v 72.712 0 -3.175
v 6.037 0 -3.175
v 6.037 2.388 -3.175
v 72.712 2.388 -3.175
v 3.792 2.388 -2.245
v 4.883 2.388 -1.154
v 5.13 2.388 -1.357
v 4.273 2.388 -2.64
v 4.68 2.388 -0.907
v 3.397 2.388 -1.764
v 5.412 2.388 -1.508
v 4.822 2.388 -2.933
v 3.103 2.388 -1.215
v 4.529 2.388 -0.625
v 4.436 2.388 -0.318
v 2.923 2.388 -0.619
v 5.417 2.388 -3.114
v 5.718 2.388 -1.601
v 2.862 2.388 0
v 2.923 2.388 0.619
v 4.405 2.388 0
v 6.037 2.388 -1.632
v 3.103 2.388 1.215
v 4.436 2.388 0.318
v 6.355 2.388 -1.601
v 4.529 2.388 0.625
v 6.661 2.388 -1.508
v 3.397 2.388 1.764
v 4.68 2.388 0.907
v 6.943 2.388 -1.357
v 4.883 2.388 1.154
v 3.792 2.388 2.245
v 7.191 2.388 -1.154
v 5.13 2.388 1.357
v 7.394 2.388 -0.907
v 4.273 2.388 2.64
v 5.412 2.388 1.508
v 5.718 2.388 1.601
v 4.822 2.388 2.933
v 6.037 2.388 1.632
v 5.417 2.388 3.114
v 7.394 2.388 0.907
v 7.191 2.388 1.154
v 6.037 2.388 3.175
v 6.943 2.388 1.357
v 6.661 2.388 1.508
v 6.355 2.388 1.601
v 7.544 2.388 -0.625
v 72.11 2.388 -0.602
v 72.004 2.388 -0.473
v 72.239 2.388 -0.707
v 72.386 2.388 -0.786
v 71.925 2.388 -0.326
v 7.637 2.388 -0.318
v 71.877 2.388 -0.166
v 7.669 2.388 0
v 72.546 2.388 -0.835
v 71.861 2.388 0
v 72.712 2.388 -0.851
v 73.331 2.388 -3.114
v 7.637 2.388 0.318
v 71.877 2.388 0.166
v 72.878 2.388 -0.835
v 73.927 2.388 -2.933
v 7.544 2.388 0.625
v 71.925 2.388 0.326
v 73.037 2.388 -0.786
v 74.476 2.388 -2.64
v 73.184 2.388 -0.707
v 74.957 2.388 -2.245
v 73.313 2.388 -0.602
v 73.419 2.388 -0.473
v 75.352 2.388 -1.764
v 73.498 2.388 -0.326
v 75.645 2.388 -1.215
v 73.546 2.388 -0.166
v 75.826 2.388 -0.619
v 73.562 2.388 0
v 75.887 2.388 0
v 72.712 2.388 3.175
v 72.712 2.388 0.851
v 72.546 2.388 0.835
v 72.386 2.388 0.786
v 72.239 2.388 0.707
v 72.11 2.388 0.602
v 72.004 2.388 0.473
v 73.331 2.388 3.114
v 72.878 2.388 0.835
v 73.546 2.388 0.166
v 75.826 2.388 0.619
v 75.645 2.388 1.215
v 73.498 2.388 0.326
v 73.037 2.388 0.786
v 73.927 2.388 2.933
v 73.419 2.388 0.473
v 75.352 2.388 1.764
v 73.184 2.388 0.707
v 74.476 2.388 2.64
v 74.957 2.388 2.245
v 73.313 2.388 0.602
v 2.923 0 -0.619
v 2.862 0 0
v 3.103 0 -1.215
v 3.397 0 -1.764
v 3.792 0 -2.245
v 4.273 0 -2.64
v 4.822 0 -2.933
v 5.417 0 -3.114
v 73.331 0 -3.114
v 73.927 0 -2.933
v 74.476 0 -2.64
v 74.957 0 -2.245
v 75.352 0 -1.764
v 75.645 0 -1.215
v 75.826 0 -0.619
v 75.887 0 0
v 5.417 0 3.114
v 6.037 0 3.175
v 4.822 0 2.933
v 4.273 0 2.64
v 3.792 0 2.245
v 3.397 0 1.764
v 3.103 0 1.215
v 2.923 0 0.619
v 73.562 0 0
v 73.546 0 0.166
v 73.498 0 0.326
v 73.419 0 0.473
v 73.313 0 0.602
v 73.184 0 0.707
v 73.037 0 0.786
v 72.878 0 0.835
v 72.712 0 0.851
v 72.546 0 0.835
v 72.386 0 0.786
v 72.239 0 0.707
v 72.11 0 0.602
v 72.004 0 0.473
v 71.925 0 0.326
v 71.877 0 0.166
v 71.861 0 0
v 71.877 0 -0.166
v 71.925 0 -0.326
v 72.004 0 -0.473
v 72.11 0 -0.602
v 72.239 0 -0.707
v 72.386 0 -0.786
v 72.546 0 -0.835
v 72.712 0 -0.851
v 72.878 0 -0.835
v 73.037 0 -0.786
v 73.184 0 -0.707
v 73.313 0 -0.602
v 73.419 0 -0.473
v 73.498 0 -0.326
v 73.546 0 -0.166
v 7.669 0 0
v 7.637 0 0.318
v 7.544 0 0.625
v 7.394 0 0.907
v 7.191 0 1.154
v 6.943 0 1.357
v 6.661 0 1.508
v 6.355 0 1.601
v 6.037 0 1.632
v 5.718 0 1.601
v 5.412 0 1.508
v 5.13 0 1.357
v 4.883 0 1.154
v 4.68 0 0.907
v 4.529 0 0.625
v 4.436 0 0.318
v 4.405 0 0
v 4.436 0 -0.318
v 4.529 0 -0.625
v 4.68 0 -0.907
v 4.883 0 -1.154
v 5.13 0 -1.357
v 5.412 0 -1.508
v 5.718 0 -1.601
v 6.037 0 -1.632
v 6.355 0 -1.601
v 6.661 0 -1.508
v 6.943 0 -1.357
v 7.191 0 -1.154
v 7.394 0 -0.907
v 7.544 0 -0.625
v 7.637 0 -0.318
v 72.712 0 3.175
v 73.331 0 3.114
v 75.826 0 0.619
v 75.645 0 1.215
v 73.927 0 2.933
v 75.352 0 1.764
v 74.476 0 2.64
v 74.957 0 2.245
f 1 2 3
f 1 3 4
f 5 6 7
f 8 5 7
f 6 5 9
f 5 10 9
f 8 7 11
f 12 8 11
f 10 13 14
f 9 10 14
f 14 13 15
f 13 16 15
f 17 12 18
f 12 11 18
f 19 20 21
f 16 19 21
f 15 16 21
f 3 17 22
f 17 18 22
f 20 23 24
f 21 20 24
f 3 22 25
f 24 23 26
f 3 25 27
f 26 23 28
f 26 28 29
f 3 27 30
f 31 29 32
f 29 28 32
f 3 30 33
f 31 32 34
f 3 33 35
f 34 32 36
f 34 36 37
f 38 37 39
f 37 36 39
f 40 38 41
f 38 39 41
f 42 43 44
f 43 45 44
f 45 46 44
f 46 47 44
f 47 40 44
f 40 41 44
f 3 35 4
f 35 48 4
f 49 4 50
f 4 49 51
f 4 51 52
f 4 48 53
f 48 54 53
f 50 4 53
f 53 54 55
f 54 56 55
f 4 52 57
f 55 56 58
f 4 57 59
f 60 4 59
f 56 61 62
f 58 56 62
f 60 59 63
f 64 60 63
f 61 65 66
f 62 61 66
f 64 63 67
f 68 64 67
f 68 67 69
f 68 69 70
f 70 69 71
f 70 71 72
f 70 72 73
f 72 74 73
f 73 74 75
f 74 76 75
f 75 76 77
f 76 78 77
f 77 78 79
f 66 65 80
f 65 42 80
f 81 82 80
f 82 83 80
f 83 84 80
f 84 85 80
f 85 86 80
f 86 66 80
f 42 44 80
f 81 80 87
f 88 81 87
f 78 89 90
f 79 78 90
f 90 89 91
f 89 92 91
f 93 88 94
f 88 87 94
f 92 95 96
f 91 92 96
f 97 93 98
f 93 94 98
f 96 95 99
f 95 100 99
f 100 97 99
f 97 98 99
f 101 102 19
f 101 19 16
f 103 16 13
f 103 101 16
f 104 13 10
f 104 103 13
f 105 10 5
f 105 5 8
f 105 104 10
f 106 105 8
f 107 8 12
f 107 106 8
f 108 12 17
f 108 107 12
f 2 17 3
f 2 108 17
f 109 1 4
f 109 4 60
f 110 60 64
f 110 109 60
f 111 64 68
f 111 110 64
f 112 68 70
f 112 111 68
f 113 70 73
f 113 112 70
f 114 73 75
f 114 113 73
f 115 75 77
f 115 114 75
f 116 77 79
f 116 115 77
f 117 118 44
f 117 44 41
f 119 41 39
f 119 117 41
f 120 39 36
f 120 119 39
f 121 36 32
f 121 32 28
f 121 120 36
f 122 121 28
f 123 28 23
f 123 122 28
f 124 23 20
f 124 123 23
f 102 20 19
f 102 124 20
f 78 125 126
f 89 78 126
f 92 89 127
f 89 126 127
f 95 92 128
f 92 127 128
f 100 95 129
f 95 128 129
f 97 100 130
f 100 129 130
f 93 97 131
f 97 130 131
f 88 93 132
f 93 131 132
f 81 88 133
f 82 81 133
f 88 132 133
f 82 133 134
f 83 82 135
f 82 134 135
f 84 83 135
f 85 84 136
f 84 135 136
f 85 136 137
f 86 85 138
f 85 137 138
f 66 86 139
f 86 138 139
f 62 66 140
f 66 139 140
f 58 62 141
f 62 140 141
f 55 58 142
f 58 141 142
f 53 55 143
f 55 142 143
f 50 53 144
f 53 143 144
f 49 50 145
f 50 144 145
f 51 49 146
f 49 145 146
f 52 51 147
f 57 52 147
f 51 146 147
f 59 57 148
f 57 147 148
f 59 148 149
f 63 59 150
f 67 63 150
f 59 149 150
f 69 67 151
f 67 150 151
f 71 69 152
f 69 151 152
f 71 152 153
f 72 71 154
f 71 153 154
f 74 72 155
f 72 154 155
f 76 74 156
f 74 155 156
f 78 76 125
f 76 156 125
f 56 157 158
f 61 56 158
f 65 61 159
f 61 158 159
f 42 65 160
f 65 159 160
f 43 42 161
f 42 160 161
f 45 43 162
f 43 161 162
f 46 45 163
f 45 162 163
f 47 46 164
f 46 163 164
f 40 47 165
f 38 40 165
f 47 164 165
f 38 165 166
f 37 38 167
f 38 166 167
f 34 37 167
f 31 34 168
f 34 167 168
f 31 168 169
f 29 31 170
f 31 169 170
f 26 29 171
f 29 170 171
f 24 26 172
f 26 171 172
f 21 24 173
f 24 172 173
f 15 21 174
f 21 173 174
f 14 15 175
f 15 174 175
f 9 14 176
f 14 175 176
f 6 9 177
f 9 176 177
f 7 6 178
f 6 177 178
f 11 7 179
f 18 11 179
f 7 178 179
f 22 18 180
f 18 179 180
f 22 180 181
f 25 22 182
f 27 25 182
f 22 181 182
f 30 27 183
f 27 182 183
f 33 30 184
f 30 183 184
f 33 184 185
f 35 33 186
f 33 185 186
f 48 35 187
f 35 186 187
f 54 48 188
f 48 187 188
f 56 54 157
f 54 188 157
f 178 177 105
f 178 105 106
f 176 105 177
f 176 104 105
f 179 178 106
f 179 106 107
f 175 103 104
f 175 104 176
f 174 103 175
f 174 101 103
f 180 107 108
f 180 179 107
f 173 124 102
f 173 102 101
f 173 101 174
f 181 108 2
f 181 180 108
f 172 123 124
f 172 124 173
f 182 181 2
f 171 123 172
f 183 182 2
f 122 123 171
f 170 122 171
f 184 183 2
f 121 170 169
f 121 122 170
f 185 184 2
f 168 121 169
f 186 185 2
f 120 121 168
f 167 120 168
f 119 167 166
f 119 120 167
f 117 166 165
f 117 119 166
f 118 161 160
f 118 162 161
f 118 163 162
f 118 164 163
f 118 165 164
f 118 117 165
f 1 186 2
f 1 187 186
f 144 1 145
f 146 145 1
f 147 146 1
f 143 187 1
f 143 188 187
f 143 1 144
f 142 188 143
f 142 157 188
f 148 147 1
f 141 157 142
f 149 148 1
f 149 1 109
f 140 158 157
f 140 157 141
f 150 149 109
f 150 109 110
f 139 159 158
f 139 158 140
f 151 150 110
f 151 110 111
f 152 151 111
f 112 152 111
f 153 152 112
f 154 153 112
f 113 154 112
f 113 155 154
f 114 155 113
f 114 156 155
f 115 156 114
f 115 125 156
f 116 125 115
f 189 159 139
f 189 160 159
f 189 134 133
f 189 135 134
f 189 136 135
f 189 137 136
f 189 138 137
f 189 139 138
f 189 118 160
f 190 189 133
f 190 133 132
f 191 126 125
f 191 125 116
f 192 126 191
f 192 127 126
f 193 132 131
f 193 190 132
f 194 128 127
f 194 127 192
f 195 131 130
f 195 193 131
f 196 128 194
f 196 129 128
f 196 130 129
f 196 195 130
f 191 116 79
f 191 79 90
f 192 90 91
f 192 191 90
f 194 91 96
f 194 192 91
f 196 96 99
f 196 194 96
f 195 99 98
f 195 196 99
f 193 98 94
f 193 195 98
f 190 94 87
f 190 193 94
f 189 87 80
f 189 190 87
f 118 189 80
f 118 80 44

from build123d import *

# Parameters (mm, degrees)
F0_R     = 1.63195
F0_R_2   = 0.8509
F1_DEPTH = 2.3876


with BuildPart() as f1:
    # F0 (on Front) → F1 (new body)
    with BuildSketch(Plane.XZ):
        with BuildLine():
            ThreePointArc((75.886587, 0), (74.956651, 2.245064), (72.711587, 3.175))
            Line((72.711587, 3.175), (6.036587, 3.175))
            ThreePointArc((6.036587, 3.175), (3.791523, 2.245064), (2.861587, 0))
            ThreePointArc((2.861587, 0), (3.791523, -2.245064), (6.036587, -3.175))
            Line((6.036587, -3.175), (72.711587, -3.175))
            ThreePointArc((72.711587, -3.175), (74.956651, -2.245064), (75.886587, 0))
        make_face()
        with Locations((6.036587, 0)):
            Circle(F0_R, mode=Mode.SUBTRACT)
        with Locations((72.711587, 0)):
            Circle(F0_R_2, mode=Mode.SUBTRACT)
    extrude(amount=-F1_DEPTH)


solid = f1.part
